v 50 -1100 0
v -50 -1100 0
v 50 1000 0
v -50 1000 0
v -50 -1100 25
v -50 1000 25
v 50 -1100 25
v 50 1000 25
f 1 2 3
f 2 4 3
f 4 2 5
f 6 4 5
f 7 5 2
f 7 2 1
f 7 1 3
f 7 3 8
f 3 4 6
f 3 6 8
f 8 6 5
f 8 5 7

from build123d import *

# Parameters (mm, degrees)
F0_W      = 100
F0_H      = 2000
F1_DEPTH  = 50
F1_FACE_W = 100
F1_FACE_H = 50
F2_DEPTH  = 100
F2_FACE_W = 100
F2_FACE_H = 2100
F3_DEPTH  = 25


with BuildPart() as f1:
    # F0 (on Top) → F1 (new body)
    with BuildSketch(Plane.XY):
        Rectangle(F0_W, F0_H)
    extrude(amount=F1_DEPTH)

    # F1_face (on face) → F2 (join)
    with BuildSketch(Plane(origin=(0, -1000, 25), x_dir=(1, 0, 0), z_dir=(0, -1, 0))):
        Rectangle(F1_FACE_W, F1_FACE_H)
    extrude(amount=F2_DEPTH)

    # F2_face (on face) → F3 (cut)
    with BuildSketch(Plane(origin=(0, -50, 50), x_dir=(1, 0, 0), z_dir=(0, 0, 1))):
        Rectangle(F2_FACE_W, F2_FACE_H)
    extrude(amount=-F3_DEPTH, mode=Mode.SUBTRACT)


solid = f1.part
